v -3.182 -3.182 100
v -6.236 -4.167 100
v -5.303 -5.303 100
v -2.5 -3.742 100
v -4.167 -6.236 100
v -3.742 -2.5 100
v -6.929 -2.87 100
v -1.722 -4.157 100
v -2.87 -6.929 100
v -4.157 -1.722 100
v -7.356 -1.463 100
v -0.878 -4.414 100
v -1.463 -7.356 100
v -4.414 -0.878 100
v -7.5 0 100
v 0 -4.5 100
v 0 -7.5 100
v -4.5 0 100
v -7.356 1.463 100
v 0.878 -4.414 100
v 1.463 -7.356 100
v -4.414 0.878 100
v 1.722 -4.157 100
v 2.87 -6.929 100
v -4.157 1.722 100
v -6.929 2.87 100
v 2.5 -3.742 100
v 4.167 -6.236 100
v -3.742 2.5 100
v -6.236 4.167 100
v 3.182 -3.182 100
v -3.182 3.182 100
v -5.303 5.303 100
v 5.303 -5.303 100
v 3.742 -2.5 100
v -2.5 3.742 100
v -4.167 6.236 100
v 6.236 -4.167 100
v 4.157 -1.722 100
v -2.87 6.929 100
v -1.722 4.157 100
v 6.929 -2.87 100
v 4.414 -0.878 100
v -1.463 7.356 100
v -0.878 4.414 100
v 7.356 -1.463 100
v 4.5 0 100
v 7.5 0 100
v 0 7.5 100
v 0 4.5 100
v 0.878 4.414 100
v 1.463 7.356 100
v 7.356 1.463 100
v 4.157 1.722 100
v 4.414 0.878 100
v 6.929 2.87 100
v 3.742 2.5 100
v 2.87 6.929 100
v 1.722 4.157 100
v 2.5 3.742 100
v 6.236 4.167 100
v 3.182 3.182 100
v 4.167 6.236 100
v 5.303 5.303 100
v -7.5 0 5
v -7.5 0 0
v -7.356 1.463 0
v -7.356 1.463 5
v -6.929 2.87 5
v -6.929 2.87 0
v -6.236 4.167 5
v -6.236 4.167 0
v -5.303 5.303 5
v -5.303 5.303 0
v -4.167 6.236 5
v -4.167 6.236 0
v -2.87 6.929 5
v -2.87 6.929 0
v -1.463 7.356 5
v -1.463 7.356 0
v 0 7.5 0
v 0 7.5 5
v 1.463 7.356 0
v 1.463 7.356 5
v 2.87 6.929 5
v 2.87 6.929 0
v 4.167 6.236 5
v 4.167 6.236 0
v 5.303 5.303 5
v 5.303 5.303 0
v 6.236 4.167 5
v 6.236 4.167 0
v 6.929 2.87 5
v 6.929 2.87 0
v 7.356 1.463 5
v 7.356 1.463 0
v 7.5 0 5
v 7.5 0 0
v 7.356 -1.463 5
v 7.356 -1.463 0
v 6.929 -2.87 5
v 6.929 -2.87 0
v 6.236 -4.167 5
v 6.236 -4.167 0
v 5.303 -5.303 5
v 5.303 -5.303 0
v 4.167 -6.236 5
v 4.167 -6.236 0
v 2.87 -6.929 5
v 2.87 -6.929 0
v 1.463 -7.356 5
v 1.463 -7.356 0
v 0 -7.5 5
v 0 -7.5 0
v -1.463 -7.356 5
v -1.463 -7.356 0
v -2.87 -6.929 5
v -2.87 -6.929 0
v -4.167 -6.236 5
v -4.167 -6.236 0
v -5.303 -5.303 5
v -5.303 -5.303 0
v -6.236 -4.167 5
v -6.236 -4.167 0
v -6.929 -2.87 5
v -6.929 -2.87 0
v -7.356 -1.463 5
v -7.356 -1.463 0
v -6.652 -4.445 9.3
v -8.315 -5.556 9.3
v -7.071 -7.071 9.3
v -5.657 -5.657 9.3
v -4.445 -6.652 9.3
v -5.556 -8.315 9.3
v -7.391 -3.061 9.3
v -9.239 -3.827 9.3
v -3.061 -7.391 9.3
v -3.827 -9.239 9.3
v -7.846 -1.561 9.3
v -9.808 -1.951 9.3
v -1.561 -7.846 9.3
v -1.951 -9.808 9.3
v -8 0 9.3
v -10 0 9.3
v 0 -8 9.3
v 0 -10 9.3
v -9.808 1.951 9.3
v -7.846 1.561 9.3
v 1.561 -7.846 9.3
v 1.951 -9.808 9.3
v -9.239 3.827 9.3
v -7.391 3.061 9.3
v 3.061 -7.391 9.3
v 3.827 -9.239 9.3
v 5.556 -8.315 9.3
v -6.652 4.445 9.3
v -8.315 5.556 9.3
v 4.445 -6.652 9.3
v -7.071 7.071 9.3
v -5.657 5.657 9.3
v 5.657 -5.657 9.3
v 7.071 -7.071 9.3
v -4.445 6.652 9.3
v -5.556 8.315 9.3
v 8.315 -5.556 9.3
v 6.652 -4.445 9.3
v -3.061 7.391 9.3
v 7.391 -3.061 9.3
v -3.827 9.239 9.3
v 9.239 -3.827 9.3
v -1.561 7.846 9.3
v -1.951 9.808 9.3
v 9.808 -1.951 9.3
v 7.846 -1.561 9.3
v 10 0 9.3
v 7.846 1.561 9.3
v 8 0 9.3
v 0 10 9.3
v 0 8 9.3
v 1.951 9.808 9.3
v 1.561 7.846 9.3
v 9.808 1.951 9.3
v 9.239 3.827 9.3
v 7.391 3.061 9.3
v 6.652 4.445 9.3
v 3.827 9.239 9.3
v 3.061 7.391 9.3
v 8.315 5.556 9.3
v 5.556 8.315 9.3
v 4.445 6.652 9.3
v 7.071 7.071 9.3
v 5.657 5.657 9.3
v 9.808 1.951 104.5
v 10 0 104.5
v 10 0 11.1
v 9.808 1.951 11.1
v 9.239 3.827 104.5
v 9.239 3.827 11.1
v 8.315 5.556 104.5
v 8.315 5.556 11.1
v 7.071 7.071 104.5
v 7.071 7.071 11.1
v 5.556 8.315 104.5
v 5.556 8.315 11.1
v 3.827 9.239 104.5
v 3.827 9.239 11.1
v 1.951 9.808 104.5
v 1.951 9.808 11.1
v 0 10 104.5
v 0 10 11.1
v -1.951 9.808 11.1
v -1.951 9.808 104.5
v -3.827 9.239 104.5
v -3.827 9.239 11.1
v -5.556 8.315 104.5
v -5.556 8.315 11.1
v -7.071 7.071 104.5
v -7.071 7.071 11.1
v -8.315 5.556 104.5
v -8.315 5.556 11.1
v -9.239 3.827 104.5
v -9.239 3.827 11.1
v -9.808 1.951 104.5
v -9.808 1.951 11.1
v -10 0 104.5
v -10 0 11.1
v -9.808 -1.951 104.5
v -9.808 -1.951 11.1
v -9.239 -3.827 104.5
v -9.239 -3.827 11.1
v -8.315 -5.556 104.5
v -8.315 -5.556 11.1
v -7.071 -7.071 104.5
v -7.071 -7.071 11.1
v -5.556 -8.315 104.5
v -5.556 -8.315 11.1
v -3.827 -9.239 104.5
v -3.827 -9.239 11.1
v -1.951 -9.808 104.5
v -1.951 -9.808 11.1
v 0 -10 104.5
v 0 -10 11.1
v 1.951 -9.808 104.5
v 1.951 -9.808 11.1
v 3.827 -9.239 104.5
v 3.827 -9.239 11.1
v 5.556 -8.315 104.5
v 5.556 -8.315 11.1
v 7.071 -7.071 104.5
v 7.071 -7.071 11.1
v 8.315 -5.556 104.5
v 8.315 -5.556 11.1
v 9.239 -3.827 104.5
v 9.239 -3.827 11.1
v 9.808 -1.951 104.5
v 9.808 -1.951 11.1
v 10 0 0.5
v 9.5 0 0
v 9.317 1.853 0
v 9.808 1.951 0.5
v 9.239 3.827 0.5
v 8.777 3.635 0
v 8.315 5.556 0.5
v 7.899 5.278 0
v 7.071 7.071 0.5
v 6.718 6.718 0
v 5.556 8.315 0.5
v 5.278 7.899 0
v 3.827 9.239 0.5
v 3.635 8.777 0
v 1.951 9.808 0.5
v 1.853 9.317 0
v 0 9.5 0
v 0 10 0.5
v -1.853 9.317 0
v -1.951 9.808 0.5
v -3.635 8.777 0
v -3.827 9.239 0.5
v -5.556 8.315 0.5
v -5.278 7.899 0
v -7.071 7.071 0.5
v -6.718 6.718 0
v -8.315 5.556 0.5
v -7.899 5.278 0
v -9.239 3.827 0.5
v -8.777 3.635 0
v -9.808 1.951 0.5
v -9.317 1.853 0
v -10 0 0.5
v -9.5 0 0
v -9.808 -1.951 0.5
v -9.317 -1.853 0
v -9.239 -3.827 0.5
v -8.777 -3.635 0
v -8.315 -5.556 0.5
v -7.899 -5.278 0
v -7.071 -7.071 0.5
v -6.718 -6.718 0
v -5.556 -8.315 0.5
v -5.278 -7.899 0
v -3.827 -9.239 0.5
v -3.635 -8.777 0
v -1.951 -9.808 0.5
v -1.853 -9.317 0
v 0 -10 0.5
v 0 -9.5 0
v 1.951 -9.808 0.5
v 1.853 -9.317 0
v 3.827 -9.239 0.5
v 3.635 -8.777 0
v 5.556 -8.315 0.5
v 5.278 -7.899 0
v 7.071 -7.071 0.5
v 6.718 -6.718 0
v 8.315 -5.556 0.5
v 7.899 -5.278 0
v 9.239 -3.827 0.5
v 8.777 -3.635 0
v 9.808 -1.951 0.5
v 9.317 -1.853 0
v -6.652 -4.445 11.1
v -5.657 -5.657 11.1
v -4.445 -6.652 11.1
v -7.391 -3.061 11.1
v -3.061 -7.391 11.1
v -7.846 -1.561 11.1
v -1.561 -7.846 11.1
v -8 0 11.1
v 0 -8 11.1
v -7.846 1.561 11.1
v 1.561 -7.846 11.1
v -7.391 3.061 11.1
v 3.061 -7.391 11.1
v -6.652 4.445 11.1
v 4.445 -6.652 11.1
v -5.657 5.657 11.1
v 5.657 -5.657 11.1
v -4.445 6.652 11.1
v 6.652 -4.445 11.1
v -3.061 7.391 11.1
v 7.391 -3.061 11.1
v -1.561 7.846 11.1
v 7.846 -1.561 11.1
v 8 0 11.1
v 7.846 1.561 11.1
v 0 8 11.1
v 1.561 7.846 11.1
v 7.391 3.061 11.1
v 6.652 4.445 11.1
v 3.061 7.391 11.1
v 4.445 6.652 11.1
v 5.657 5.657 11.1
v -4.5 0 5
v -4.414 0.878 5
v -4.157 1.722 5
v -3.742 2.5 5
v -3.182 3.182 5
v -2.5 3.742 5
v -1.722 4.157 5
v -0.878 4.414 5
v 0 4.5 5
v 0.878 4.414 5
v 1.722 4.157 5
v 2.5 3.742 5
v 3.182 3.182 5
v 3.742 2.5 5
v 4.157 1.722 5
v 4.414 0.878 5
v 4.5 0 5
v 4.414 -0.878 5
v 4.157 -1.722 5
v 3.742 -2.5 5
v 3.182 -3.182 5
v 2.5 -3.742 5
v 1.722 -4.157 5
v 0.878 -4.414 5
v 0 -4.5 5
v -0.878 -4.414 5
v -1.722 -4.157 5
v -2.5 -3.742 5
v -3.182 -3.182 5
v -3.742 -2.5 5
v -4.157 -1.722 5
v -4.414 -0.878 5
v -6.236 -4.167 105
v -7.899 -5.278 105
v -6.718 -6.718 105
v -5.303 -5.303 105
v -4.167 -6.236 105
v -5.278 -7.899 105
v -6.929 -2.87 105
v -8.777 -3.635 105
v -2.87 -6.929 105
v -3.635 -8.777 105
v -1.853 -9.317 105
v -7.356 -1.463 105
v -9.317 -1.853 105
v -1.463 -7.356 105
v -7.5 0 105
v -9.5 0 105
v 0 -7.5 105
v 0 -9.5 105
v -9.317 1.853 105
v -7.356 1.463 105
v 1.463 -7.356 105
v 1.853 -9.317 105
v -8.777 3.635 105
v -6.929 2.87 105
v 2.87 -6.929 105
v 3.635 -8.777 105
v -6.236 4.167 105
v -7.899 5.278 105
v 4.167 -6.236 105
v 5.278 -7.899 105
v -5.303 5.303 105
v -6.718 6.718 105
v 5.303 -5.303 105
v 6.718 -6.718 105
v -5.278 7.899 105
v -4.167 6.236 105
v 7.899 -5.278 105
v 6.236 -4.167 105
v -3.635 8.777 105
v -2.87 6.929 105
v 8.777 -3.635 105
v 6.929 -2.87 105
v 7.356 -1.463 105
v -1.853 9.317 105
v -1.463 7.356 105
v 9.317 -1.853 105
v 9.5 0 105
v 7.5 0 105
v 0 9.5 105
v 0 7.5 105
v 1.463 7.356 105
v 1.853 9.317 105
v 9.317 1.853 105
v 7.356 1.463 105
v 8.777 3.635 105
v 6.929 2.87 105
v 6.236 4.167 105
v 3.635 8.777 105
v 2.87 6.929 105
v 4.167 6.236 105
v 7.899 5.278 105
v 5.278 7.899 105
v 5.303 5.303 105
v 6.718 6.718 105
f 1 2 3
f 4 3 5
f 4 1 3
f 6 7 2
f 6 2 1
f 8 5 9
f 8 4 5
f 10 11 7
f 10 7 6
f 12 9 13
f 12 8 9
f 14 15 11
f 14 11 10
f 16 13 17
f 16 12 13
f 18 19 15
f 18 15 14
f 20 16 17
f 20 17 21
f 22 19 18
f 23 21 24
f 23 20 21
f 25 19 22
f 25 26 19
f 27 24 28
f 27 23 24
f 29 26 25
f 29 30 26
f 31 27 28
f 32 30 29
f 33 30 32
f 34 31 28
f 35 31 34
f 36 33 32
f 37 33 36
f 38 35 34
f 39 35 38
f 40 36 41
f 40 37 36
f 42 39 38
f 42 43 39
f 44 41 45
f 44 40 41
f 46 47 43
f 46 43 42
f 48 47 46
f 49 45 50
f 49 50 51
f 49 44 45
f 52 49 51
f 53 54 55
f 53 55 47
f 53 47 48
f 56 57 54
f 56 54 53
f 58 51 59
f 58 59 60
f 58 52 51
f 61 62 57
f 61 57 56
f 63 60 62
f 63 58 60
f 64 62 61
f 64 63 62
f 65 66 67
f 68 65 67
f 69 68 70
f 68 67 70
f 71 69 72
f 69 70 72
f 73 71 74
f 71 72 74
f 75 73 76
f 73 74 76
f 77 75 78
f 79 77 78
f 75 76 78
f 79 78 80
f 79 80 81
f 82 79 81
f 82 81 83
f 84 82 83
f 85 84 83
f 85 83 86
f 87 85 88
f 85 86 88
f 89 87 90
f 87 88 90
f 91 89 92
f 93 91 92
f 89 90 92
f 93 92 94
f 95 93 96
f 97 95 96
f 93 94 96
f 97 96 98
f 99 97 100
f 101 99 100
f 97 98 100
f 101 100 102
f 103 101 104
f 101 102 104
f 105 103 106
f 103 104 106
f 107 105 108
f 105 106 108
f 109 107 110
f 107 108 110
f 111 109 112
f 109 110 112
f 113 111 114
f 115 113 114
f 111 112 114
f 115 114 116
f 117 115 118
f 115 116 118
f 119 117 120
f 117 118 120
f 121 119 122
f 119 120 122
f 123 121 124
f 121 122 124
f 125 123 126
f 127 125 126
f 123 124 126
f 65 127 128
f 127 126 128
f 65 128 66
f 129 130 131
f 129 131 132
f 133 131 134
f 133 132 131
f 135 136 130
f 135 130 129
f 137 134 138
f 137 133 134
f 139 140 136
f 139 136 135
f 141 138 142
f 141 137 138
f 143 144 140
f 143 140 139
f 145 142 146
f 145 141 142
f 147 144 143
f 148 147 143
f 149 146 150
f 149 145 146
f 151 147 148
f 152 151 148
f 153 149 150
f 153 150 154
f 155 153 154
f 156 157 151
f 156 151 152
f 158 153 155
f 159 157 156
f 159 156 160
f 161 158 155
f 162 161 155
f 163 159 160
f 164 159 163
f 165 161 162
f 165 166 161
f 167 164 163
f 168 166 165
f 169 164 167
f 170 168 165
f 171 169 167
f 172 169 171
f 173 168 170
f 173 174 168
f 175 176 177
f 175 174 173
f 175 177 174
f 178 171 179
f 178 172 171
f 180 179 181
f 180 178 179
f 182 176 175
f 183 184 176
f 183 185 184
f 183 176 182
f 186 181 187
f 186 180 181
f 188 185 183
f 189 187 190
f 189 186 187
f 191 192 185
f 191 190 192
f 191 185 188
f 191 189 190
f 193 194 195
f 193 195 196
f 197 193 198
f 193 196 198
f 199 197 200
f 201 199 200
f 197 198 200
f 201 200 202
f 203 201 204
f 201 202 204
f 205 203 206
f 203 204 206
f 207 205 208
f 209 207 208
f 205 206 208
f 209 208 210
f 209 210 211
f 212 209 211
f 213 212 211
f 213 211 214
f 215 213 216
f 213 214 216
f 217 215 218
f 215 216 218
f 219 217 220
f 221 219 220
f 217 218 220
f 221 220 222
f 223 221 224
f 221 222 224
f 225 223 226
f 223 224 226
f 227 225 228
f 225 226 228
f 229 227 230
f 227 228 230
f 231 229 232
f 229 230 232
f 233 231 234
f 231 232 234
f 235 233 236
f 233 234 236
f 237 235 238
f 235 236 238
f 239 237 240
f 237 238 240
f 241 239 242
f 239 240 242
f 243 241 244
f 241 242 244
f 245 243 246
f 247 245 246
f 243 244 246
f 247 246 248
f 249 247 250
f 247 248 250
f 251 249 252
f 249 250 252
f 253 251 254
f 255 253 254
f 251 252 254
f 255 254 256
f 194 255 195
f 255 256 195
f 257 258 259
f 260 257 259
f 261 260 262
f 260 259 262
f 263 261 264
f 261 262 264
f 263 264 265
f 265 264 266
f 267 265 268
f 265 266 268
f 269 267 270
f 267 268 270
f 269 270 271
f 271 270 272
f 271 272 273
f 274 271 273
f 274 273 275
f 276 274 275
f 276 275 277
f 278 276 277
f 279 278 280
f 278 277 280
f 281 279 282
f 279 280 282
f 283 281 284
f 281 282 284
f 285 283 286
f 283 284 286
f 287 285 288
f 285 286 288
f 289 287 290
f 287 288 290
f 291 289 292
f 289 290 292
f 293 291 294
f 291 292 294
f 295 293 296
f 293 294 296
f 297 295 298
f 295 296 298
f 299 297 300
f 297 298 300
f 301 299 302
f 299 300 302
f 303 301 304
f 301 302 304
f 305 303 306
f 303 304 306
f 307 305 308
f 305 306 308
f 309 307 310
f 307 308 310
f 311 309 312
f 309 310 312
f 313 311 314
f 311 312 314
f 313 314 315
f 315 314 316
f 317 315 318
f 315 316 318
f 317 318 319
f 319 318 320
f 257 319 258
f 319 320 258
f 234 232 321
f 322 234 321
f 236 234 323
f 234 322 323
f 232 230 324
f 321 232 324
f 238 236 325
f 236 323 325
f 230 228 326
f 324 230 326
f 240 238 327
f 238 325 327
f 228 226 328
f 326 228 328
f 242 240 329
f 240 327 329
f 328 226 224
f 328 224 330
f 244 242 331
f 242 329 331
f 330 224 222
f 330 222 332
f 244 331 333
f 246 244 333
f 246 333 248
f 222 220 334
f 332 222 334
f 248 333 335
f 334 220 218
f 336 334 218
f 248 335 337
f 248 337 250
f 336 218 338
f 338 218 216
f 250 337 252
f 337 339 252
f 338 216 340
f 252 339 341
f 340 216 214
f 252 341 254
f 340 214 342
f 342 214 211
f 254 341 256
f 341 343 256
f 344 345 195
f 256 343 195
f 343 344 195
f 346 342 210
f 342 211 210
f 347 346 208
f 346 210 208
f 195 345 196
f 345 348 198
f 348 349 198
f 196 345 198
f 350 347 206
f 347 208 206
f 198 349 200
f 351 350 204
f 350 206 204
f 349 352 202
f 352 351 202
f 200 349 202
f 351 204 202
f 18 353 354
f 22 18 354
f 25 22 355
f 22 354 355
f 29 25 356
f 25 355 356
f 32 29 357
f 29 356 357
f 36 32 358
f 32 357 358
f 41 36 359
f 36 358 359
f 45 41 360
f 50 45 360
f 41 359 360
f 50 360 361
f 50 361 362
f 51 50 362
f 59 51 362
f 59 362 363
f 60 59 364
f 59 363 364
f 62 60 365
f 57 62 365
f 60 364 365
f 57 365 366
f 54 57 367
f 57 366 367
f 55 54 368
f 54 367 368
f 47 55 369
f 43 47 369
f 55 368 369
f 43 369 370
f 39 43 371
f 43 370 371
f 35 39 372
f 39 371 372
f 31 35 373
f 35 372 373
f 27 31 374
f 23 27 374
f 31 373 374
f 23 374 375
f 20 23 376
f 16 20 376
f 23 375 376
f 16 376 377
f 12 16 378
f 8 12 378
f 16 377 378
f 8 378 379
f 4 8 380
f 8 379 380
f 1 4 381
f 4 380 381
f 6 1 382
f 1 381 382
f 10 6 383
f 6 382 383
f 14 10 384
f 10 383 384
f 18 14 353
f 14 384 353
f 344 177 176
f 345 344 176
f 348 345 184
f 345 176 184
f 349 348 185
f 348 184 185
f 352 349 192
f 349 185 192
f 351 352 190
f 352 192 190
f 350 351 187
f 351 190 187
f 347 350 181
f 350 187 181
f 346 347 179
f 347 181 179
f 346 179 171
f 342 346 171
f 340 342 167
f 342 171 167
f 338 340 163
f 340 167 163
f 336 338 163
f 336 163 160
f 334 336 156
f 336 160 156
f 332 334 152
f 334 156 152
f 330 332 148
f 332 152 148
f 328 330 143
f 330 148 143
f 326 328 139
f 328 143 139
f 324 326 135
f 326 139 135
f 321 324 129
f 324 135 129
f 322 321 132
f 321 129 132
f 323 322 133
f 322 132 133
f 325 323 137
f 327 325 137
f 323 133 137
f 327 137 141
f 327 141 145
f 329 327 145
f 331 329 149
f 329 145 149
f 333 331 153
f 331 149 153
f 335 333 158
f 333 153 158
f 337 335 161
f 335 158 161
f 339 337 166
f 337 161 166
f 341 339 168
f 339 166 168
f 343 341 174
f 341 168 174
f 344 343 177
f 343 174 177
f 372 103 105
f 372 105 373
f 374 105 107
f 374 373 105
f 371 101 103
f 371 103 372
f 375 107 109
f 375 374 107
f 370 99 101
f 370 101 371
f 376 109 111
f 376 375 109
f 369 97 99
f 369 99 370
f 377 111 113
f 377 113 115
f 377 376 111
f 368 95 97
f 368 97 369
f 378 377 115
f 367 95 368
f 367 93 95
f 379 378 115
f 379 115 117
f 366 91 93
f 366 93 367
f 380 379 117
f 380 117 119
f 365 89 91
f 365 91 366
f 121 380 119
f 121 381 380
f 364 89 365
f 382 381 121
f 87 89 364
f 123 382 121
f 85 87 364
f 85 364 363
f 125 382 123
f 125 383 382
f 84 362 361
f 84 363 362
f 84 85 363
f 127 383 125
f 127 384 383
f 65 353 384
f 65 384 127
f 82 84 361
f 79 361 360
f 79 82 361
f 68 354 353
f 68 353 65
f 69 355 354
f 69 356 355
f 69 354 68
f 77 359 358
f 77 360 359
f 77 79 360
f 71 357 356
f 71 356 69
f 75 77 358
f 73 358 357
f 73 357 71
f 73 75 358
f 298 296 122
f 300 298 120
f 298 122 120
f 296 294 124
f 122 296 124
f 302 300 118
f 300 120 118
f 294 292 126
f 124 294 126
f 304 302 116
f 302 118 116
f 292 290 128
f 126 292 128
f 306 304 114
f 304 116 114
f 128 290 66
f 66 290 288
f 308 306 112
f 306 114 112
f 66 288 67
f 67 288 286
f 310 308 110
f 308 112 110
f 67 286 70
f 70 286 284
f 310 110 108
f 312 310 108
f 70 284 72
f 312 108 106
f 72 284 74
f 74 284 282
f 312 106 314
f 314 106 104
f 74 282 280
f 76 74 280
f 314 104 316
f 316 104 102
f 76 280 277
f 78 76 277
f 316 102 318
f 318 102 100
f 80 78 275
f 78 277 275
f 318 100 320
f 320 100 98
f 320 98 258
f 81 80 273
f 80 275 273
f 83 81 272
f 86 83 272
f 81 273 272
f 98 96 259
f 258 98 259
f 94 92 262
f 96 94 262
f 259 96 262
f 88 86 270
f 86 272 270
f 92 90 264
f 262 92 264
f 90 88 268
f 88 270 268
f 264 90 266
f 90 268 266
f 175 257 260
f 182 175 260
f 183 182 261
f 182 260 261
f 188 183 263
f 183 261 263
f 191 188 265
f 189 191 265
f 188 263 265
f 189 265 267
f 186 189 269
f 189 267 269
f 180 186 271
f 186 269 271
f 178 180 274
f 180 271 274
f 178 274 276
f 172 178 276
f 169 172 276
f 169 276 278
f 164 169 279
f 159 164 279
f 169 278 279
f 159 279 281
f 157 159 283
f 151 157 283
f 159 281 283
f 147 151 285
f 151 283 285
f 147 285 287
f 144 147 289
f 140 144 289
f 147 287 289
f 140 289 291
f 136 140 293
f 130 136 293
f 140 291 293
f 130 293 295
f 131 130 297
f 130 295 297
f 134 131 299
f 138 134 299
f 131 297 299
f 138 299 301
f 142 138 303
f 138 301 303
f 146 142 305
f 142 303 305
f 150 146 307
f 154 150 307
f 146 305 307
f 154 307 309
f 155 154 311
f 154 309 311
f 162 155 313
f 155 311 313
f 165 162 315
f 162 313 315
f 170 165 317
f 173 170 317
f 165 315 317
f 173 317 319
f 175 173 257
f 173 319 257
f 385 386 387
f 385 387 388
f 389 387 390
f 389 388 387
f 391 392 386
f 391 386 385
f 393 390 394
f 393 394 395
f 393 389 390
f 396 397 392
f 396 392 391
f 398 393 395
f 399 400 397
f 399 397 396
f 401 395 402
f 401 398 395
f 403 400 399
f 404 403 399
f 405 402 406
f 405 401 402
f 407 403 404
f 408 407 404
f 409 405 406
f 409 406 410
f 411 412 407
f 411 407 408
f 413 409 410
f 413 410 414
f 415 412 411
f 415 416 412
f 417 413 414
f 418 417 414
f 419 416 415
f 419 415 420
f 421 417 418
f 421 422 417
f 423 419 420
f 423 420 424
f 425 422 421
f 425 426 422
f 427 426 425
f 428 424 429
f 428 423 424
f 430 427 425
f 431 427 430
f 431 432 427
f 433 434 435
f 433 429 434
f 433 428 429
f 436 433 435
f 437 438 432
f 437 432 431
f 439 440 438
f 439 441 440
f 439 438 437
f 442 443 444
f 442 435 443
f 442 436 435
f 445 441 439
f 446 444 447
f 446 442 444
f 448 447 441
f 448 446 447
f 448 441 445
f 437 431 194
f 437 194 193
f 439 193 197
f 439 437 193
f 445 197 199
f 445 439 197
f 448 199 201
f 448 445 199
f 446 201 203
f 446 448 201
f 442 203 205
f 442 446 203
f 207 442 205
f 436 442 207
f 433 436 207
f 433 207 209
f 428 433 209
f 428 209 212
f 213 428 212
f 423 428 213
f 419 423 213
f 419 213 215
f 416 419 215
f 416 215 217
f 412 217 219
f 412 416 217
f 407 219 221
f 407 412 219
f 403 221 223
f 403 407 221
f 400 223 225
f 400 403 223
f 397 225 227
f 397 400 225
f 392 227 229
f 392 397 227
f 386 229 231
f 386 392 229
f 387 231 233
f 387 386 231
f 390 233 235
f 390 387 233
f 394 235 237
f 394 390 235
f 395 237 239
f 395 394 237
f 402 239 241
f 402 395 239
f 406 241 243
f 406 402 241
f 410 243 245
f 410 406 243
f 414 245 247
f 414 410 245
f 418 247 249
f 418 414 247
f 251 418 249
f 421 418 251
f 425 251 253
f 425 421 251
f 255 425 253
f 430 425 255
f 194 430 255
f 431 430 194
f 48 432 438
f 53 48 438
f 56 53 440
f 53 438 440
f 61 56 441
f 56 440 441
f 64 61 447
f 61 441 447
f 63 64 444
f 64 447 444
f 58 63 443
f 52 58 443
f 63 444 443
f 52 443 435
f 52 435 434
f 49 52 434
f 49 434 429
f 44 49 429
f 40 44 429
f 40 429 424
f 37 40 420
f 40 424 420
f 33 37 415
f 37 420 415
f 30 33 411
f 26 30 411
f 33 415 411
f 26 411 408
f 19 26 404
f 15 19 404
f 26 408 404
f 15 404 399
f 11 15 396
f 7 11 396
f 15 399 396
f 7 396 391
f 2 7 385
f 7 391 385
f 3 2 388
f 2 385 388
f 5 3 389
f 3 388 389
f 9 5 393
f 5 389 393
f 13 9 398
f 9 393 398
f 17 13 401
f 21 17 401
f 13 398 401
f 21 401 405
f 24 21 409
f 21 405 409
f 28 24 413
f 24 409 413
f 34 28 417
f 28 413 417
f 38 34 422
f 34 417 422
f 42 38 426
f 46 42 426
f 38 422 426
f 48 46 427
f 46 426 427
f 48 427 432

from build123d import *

# Parameters (mm, degrees)
SKETCH1_R           = 10
BOSS_EXTRUDE1_DEPTH = 9.3
SKETCH3_R           = 8
BOSS_EXTRUDE2_DEPTH = 1.8
SKETCH4_R           = 10
BOSS_EXTRUDE3_DEPTH = 93.9
SKETCH5_R           = 7.5
CUT_EXTRUDE1_DEPTH  = 5
SKETCH6_R           = 4.5
CUT_EXTRUDE2_DEPTH  = 95
SKETCH7_R           = 7.5
CUT_EXTRUDE3_DEPTH  = 5
CHAMFER1_SIZE       = 0.5


with BuildPart() as part:
    # Sketch1 → Boss-Extrude1 (new body)
    with BuildSketch(Plane.XY):
        Circle(SKETCH1_R)
    extrude(amount=BOSS_EXTRUDE1_DEPTH)

    # Sketch3 → Boss-Extrude2 (add)
    with BuildSketch(Plane.XY.offset(9.3)):
        Circle(SKETCH3_R)
    extrude(amount=BOSS_EXTRUDE2_DEPTH)

    # Sketch4 → Boss-Extrude3 (add)
    with BuildSketch(Plane.XY.offset(11.1)):
        Circle(SKETCH4_R)
    extrude(amount=BOSS_EXTRUDE3_DEPTH)

    # Sketch5 → Cut-Extrude1 (cut)
    with BuildSketch(Plane(origin=(0, 0, 0), x_dir=(-1, 0, 0), z_dir=(0, 0, -1))):
        Circle(SKETCH5_R)
    extrude(amount=-CUT_EXTRUDE1_DEPTH, mode=Mode.SUBTRACT)

    # Sketch6 → Cut-Extrude2 (cut)
    with BuildSketch(Plane(origin=(0, 0, 5), x_dir=(-1, 0, 0), z_dir=(0, 0, -1))):
        Circle(SKETCH6_R)
    extrude(amount=-CUT_EXTRUDE2_DEPTH, mode=Mode.SUBTRACT)

    # Sketch7 → Cut-Extrude3 (cut)
    with BuildSketch(Plane.XY.offset(105)):
        Circle(SKETCH7_R)
    extrude(amount=-CUT_EXTRUDE3_DEPTH, mode=Mode.SUBTRACT)

    # Chamfer1
    chamfer1_edges = [part.edges().sort_by_distance(p)[0] for p in [
        (-10, 0, 0),
        (-10, 0, 105),
    ]]
    chamfer(chamfer1_edges, length=CHAMFER1_SIZE)


solid = part.part
